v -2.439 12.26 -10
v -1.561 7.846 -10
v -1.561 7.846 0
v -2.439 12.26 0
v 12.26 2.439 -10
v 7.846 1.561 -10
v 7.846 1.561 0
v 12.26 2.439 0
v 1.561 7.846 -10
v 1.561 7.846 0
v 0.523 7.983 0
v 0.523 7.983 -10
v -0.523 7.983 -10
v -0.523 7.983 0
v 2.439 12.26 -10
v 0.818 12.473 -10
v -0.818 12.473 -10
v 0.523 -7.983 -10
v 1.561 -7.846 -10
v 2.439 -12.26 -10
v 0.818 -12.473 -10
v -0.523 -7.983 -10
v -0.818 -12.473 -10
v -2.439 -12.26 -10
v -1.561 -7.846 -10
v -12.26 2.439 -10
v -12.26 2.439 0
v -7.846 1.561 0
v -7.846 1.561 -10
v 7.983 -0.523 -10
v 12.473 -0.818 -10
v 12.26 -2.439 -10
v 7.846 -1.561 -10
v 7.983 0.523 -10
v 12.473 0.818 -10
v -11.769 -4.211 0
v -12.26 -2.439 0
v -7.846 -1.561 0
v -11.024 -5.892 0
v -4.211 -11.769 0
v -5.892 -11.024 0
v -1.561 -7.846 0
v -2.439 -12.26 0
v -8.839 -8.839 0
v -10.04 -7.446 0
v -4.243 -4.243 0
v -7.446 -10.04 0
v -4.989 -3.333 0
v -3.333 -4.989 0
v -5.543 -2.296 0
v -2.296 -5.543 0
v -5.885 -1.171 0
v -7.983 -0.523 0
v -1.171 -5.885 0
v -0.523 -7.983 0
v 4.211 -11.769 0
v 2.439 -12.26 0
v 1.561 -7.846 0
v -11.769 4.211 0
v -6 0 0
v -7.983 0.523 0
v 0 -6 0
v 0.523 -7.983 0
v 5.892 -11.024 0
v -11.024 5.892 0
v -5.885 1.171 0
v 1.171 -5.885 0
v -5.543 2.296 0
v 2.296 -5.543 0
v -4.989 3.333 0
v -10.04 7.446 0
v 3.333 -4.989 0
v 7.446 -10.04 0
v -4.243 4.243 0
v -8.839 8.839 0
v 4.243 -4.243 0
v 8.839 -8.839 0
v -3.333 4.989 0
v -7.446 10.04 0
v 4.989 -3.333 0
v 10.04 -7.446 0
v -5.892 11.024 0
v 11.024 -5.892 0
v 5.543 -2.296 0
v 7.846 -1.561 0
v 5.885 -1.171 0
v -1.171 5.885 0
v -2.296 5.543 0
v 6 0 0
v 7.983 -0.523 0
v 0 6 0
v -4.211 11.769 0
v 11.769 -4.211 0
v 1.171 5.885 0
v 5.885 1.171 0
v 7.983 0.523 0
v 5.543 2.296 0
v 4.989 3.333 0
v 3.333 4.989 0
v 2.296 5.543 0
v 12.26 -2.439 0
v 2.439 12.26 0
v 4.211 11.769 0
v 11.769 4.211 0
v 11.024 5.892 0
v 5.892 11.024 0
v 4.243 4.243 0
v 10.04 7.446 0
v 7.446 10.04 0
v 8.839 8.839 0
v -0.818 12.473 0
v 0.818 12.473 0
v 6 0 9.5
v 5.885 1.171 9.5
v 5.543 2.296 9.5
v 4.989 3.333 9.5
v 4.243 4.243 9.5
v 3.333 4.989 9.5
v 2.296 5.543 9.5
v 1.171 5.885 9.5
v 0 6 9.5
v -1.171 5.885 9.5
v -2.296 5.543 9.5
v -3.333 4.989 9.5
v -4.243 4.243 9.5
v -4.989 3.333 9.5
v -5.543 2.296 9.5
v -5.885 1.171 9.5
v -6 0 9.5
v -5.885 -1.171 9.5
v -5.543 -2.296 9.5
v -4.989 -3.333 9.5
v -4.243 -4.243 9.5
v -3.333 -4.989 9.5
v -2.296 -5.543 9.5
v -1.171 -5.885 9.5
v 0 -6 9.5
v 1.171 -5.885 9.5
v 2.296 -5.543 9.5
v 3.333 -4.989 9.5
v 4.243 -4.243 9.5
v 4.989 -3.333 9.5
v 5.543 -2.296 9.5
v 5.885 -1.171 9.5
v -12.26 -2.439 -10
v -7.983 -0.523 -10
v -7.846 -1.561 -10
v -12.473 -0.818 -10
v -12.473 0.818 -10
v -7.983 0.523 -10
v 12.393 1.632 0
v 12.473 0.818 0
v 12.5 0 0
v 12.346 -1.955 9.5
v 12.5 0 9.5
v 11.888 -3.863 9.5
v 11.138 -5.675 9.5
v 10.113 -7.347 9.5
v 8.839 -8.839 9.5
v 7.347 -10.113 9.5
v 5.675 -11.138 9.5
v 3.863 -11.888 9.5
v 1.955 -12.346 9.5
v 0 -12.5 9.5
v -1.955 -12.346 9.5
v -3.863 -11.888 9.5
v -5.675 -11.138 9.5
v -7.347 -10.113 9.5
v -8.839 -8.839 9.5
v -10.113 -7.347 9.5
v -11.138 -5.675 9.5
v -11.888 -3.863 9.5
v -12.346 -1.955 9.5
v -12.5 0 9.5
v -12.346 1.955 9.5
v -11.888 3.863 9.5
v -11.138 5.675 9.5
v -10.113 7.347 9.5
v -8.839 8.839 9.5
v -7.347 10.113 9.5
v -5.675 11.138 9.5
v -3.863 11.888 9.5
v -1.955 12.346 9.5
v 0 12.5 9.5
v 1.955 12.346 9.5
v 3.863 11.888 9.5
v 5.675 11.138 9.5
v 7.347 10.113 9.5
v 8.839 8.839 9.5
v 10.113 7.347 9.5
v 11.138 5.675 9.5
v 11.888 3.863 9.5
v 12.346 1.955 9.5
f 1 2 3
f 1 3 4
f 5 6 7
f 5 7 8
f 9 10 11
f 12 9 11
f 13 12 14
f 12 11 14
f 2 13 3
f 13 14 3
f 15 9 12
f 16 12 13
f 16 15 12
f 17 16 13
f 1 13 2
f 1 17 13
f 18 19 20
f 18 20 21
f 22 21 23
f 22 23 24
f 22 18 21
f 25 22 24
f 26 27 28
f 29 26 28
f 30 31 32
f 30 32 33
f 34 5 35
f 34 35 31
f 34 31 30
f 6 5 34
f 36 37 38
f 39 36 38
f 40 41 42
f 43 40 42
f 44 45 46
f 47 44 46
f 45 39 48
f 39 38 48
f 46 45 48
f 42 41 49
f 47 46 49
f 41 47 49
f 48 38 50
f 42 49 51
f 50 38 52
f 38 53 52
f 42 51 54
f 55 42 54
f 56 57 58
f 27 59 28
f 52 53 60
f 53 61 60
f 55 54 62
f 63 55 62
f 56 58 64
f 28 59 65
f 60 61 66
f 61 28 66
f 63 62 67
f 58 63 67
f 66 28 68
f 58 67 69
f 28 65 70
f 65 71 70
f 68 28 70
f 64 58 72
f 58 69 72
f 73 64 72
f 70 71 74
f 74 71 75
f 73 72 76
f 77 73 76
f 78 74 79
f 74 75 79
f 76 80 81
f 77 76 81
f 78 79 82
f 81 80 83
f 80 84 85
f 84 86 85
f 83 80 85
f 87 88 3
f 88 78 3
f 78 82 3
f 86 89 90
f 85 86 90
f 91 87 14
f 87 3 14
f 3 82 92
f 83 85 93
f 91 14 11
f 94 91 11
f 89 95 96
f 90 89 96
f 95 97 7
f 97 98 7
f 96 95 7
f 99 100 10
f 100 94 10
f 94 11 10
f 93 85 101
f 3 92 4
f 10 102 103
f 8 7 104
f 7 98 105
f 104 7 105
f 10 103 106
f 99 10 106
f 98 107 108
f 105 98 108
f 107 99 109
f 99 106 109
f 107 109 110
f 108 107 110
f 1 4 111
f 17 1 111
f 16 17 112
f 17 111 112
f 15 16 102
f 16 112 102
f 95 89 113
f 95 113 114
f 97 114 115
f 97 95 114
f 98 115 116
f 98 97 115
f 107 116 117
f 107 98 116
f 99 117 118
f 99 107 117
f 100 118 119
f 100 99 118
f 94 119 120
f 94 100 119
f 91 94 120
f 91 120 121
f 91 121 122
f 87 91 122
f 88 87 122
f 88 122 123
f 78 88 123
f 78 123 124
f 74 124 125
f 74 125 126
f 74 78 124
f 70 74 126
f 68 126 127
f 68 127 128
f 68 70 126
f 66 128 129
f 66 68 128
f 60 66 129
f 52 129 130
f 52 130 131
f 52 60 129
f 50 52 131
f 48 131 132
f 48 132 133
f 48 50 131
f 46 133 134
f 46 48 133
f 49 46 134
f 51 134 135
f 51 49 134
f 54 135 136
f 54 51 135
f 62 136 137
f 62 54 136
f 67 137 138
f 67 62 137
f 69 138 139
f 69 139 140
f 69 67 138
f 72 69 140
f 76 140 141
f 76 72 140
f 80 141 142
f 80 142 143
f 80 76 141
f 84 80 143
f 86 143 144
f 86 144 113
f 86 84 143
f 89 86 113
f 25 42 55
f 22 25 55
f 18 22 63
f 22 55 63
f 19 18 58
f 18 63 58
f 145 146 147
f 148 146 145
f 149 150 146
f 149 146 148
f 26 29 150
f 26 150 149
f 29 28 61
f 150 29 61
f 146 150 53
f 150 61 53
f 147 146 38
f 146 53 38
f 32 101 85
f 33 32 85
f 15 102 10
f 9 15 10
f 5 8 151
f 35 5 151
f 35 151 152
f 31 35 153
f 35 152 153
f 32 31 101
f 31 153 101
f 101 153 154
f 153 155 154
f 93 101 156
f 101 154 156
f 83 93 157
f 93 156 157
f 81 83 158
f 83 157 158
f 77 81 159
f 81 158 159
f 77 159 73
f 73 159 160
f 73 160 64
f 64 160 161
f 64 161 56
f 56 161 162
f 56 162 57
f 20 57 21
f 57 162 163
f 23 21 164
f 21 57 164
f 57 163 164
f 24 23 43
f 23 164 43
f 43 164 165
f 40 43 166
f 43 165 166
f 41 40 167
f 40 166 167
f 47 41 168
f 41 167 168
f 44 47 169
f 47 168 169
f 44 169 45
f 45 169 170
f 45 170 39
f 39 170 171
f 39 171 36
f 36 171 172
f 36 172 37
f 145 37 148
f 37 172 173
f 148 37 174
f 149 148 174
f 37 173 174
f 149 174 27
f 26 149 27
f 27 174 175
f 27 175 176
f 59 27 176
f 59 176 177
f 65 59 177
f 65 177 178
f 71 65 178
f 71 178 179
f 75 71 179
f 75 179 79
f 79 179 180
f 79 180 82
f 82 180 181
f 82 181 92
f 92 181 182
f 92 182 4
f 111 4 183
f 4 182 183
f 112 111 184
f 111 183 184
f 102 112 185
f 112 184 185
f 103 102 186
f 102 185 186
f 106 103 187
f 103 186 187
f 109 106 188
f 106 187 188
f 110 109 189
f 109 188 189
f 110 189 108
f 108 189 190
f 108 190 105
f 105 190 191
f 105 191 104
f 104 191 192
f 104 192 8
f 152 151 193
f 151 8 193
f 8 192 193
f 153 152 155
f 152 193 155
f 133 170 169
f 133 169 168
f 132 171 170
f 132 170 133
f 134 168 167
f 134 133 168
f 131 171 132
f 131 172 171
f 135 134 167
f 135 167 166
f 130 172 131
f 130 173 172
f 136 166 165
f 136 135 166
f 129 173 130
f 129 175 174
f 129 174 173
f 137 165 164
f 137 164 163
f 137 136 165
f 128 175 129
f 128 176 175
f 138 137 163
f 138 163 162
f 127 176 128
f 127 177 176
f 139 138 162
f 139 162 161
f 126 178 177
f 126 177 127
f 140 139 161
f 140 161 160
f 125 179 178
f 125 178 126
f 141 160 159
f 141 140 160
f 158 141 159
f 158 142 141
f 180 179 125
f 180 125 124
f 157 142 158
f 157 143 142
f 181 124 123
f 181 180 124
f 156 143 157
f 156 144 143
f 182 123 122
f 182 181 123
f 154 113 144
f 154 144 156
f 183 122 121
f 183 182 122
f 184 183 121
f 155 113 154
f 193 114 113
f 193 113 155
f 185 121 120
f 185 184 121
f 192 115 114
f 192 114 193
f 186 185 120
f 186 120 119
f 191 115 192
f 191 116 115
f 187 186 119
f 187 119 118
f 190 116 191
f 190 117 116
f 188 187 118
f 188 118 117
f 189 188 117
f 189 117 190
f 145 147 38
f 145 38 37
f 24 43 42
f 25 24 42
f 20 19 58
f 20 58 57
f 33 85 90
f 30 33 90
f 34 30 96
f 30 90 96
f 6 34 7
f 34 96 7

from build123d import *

# Parameters (mm, degrees)
SKETCH_1_R      = 12.5
SKETCH_1_R_2    = 6
EXTRUDE_1_DEPTH = 9.5
EXTRUDE_2_DEPTH = 10


with BuildPart() as part:
    # 草图1 → 凸台-拉伸1 (new body)
    with BuildSketch(Plane.XY):
        Circle(SKETCH_1_R)
        Circle(SKETCH_1_R_2, mode=Mode.SUBTRACT)
    extrude(amount=EXTRUDE_1_DEPTH)

    # 草图2 → 凸台-拉伸2 (add)
    with BuildSketch(Plane(origin=(0, 0, 0), x_dir=(-1, 0, 0), z_dir=(0, 0, -1))):
        with BuildLine():
            Line((7.846282243, -1.560722576), (12.259816005, -2.438629025))
            ThreePointArc((12.259816005, -2.438629025), (12.5, 0), (12.259816005, 2.438629025))
            Line((12.259816005, 2.438629025), (7.846282243, 1.560722576))
            ThreePointArc((7.846282243, 1.560722576), (8, 0), (7.846282243, -1.560722576))
        make_face()
        with BuildLine():
            Line((1.560722576, 7.846282243), (2.438629025, 12.259816005))
            ThreePointArc((2.438629025, 12.259816005), (0, 12.5), (-2.438629025, 12.259816005))
            Line((-2.438629025, 12.259816005), (-1.560722576, 7.846282243))
            ThreePointArc((-1.560722576, 7.846282243), (0, 8), (1.560722576, 7.846282243))
        make_face()
        with BuildLine():
            Line((-1.560722576, -7.846282243), (-2.438629025, -12.259816005))
            ThreePointArc((-2.438629025, -12.259816005), (0, -12.5), (2.438629025, -12.259816005))
            Line((2.438629025, -12.259816005), (1.560722576, -7.846282243))
            ThreePointArc((1.560722576, -7.846282243), (0, -8), (-1.560722576, -7.846282243))
        make_face()
        with BuildLine():
            Line((-7.846282243, 1.560722576), (-12.259816005, 2.438629025))
            ThreePointArc((-12.259816005, 2.438629025), (-12.5, 0), (-12.259816005, -2.438629025))
            Line((-12.259816005, -2.438629025), (-7.846282243, -1.560722576))
            ThreePointArc((-7.846282243, -1.560722576), (-8, 0), (-7.846282243, 1.560722576))
        make_face()
    extrude(amount=EXTRUDE_2_DEPTH)


solid = part.part
